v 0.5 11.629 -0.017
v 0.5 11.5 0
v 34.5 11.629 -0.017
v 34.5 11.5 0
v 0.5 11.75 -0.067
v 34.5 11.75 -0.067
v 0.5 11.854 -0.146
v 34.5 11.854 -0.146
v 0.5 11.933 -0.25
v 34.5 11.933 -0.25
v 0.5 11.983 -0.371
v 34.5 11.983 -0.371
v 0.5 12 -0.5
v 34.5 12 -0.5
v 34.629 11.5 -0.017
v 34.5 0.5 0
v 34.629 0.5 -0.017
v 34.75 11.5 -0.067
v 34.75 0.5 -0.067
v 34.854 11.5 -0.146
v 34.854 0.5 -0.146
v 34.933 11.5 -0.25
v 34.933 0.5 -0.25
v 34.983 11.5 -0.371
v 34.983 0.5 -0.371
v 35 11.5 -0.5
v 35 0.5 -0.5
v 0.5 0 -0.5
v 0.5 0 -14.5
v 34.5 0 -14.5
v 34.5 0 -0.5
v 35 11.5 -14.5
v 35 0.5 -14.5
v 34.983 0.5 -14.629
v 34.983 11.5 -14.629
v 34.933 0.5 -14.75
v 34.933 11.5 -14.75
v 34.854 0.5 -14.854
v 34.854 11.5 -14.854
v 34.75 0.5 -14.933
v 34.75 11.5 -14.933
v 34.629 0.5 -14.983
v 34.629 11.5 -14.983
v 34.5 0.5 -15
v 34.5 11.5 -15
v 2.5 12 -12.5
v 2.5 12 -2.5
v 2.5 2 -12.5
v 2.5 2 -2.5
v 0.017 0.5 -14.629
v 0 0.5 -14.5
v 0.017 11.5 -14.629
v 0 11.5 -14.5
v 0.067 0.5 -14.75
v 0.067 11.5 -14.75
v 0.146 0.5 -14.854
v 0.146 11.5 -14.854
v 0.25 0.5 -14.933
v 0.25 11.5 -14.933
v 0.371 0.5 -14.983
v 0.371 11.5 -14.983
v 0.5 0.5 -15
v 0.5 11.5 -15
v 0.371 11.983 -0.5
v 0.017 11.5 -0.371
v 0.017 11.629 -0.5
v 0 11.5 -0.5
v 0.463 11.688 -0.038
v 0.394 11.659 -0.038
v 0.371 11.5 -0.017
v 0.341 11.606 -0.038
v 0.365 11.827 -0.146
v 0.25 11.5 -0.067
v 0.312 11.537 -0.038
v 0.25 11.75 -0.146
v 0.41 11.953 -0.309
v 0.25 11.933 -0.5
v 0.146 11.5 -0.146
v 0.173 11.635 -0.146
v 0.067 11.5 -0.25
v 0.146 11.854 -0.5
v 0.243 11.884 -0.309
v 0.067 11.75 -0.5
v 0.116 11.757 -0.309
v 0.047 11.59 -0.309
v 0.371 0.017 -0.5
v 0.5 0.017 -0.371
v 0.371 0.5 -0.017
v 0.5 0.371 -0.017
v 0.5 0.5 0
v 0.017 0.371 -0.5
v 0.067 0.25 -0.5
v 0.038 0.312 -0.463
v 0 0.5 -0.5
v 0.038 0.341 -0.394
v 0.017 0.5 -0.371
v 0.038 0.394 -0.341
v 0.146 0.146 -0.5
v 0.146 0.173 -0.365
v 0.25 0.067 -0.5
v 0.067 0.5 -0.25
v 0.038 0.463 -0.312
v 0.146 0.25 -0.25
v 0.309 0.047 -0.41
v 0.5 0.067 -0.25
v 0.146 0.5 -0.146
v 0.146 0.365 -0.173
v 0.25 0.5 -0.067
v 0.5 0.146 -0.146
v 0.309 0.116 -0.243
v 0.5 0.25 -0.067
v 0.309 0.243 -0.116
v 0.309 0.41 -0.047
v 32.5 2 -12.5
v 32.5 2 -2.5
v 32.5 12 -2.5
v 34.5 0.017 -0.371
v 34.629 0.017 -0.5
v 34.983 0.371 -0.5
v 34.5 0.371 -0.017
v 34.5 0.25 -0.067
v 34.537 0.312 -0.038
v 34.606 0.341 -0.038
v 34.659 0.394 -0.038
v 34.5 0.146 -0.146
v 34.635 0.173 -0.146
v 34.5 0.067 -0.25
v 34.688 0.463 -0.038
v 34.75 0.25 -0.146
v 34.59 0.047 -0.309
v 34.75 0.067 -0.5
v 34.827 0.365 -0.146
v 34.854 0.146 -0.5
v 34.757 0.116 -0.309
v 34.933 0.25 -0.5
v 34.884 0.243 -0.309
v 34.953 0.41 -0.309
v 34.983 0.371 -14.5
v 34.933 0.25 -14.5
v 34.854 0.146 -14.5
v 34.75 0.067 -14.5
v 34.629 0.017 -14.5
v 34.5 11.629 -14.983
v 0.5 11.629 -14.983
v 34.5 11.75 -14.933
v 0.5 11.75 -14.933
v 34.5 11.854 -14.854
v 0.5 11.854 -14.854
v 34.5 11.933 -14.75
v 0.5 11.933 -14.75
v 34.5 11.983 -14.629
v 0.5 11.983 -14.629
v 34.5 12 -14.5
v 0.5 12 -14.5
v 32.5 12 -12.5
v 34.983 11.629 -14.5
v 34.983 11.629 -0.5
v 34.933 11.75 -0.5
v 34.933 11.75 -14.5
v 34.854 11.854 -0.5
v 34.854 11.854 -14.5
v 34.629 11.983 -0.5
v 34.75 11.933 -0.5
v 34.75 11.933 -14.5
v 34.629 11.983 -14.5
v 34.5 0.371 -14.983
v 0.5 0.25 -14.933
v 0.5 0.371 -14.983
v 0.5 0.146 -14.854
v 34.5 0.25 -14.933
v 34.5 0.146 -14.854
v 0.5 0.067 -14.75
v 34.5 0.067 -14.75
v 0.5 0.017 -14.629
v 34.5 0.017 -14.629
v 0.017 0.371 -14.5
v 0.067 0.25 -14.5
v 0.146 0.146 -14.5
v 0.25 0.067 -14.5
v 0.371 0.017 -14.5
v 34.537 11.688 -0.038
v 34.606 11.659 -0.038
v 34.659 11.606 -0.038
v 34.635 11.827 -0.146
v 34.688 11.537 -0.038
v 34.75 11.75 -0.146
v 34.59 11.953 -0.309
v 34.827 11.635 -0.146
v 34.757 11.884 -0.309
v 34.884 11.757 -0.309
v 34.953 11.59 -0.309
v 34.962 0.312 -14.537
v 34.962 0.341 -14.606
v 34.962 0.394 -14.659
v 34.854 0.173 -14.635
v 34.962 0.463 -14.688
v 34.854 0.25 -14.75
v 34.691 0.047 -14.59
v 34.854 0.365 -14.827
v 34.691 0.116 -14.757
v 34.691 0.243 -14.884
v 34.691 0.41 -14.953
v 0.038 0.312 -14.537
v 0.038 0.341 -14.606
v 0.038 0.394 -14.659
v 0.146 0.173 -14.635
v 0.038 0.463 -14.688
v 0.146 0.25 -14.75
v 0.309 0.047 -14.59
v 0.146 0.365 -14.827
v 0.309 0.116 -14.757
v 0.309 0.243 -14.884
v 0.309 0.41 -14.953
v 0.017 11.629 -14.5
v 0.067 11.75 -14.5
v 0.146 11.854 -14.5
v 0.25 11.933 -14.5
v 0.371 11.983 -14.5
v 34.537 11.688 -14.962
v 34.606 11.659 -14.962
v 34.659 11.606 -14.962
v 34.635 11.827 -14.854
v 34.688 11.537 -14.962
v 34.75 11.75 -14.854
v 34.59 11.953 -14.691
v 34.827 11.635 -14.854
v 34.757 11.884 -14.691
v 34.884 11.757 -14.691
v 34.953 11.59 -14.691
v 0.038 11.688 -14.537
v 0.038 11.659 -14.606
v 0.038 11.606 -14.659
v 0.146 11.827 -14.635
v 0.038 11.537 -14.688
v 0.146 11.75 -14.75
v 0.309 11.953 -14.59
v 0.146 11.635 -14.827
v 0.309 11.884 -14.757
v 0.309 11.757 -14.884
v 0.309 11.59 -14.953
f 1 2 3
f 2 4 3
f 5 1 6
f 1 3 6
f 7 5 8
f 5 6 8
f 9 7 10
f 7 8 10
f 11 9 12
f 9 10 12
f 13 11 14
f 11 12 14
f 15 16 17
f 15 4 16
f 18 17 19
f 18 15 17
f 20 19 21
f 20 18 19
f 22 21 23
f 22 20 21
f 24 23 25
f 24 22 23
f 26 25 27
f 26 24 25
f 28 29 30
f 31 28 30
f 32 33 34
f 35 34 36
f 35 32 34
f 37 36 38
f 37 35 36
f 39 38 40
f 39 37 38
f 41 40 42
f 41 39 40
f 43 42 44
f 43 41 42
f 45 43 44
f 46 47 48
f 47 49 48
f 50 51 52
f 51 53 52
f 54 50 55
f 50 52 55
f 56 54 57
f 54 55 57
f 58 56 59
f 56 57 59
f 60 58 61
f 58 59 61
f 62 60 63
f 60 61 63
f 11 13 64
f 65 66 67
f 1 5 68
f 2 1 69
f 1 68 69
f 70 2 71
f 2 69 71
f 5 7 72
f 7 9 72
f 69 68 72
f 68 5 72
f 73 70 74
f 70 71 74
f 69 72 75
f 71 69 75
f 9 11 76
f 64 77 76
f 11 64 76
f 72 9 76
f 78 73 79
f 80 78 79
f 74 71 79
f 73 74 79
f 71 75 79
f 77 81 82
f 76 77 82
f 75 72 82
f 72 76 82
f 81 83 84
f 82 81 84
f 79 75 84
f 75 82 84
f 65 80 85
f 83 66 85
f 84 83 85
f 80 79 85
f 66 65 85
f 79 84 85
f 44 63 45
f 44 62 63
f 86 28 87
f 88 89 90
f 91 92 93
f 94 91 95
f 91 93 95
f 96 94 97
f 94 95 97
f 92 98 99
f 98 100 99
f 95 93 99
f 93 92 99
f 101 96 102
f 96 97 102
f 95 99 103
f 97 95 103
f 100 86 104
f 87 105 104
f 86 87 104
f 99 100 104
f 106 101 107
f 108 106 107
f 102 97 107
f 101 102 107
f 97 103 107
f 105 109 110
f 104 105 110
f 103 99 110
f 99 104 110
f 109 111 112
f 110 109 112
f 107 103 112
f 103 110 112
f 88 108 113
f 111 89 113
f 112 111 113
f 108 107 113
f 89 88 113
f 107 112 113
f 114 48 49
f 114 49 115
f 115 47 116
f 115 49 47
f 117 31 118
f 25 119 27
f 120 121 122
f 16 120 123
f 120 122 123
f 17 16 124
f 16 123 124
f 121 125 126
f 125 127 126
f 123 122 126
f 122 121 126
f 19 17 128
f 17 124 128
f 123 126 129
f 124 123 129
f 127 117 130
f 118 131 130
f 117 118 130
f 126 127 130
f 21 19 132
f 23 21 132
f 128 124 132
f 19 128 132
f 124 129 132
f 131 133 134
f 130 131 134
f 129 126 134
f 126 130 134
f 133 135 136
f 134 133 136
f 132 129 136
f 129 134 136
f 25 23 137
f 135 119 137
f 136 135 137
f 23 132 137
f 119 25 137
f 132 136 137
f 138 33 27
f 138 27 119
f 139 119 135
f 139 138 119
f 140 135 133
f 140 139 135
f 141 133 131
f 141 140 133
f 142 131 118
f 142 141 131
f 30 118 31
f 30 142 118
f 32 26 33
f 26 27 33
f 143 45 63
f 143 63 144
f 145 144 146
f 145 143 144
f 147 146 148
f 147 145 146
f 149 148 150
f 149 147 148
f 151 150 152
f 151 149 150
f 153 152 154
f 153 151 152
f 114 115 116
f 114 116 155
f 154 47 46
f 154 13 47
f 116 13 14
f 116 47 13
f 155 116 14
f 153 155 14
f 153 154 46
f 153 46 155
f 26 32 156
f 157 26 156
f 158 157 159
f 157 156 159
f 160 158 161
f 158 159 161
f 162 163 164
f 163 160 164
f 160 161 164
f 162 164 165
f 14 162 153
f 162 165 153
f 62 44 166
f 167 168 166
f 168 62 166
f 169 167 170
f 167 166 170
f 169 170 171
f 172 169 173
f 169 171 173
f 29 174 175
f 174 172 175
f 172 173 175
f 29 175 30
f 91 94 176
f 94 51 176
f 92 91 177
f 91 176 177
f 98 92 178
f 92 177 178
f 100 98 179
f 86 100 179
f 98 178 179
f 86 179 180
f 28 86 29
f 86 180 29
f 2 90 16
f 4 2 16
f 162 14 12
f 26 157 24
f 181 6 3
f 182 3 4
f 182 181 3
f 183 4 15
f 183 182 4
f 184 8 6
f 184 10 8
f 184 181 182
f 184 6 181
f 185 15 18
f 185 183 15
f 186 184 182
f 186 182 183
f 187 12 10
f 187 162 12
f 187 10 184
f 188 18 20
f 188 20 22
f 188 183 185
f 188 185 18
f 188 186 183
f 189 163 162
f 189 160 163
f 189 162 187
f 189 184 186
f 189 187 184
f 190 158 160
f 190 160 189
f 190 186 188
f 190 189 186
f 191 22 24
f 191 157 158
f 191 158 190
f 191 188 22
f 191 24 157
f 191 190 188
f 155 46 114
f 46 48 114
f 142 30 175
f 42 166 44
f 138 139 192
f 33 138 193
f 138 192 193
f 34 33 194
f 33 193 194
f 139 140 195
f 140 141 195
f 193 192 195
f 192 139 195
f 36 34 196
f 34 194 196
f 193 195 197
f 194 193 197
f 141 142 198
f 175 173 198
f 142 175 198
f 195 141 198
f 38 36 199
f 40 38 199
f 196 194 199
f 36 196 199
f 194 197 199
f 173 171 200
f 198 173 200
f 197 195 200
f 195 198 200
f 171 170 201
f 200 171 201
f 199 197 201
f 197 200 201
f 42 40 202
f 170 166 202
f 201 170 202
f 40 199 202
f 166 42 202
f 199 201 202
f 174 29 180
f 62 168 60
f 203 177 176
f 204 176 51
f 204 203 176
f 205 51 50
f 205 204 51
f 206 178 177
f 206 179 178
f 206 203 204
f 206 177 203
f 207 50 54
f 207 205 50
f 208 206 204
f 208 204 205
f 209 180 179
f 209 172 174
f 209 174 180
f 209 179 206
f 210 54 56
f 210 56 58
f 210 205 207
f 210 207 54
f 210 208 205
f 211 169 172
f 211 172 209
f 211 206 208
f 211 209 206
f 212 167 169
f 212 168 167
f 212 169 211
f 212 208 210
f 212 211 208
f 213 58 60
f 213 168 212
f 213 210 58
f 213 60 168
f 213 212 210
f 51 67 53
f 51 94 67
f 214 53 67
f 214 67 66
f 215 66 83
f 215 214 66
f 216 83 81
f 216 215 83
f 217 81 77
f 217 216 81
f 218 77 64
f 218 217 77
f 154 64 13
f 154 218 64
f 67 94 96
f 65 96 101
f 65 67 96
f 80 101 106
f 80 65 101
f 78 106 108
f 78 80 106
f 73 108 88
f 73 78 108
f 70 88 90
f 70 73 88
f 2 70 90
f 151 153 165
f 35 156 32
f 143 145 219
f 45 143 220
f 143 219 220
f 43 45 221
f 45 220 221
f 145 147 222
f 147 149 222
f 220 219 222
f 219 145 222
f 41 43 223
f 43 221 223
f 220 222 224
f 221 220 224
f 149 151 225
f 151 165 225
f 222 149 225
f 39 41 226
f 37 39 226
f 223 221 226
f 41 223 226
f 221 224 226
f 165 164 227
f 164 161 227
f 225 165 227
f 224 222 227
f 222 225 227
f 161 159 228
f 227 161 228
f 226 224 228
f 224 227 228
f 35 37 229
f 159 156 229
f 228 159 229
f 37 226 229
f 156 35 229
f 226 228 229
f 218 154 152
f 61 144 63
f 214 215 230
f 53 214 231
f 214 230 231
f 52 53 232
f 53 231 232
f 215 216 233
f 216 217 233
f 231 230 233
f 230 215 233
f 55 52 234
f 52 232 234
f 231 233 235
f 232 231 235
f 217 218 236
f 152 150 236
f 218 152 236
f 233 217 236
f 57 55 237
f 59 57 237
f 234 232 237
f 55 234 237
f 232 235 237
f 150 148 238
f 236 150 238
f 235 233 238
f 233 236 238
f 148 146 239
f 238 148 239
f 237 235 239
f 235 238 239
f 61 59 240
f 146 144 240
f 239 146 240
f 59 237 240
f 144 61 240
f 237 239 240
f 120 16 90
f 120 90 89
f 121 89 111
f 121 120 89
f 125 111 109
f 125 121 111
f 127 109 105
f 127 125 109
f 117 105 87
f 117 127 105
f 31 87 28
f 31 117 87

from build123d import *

# Parameters (mm, degrees)
SKETCH1_W           = 35
SKETCH1_H           = 15
BOSS_EXTRUDE1_DEPTH = 12
SHELL1_T            = -2.5
FILLET1_R           = 0.5
SKETCH3_W           = 30
SKETCH3_H           = 10
CUT_EXTRUDE1_DEPTH  = 0.5


with BuildPart() as part:
    # Sketch1 → Boss-Extrude1 (new body)
    with BuildSketch(Plane(origin=(0, 0, 0), x_dir=(1, 0, 0), z_dir=(0, 1, 0))):
        with Locations((17.5, 7.5)):
            Rectangle(SKETCH1_W, SKETCH1_H)
    extrude(amount=BOSS_EXTRUDE1_DEPTH)

    # Shell1
    shell1_openings = [part.faces().sort_by_distance(p)[0] for p in [
        (17.5, 12, -7.5),
    ]]
    offset(amount=SHELL1_T, openings=shell1_openings, kind=Kind.INTERSECTION)

    # Fillet1
    fillet1_edges = [part.edges().sort_by_distance(p)[0] for p in [
        (35, 12, -7.5),
        (17.5, 12, -15),
        (0, 12, -7.5),
        (17.5, 0, -15),
        (35, 0, -7.5),
        (17.5, 0, 0),
        (0, 0, -7.5),
        (17.5, 12, 0),
        (0, 6, -15),
        (35, 6, -15),
        (35, 6, 0),
        (0, 6, 0),
    ]]
    fillet(fillet1_edges, radius=FILLET1_R)

    # Sketch3 → Cut-Extrude1 (cut)
    with BuildSketch(Plane(origin=(0, 2.5, 0), x_dir=(1, 0, 0), z_dir=(0, 1, 0))):
        with Locations((17.5, 7.5)):
            Rectangle(SKETCH3_W, SKETCH3_H)
    extrude(amount=-CUT_EXTRUDE1_DEPTH, mode=Mode.SUBTRACT)


solid = part.part
